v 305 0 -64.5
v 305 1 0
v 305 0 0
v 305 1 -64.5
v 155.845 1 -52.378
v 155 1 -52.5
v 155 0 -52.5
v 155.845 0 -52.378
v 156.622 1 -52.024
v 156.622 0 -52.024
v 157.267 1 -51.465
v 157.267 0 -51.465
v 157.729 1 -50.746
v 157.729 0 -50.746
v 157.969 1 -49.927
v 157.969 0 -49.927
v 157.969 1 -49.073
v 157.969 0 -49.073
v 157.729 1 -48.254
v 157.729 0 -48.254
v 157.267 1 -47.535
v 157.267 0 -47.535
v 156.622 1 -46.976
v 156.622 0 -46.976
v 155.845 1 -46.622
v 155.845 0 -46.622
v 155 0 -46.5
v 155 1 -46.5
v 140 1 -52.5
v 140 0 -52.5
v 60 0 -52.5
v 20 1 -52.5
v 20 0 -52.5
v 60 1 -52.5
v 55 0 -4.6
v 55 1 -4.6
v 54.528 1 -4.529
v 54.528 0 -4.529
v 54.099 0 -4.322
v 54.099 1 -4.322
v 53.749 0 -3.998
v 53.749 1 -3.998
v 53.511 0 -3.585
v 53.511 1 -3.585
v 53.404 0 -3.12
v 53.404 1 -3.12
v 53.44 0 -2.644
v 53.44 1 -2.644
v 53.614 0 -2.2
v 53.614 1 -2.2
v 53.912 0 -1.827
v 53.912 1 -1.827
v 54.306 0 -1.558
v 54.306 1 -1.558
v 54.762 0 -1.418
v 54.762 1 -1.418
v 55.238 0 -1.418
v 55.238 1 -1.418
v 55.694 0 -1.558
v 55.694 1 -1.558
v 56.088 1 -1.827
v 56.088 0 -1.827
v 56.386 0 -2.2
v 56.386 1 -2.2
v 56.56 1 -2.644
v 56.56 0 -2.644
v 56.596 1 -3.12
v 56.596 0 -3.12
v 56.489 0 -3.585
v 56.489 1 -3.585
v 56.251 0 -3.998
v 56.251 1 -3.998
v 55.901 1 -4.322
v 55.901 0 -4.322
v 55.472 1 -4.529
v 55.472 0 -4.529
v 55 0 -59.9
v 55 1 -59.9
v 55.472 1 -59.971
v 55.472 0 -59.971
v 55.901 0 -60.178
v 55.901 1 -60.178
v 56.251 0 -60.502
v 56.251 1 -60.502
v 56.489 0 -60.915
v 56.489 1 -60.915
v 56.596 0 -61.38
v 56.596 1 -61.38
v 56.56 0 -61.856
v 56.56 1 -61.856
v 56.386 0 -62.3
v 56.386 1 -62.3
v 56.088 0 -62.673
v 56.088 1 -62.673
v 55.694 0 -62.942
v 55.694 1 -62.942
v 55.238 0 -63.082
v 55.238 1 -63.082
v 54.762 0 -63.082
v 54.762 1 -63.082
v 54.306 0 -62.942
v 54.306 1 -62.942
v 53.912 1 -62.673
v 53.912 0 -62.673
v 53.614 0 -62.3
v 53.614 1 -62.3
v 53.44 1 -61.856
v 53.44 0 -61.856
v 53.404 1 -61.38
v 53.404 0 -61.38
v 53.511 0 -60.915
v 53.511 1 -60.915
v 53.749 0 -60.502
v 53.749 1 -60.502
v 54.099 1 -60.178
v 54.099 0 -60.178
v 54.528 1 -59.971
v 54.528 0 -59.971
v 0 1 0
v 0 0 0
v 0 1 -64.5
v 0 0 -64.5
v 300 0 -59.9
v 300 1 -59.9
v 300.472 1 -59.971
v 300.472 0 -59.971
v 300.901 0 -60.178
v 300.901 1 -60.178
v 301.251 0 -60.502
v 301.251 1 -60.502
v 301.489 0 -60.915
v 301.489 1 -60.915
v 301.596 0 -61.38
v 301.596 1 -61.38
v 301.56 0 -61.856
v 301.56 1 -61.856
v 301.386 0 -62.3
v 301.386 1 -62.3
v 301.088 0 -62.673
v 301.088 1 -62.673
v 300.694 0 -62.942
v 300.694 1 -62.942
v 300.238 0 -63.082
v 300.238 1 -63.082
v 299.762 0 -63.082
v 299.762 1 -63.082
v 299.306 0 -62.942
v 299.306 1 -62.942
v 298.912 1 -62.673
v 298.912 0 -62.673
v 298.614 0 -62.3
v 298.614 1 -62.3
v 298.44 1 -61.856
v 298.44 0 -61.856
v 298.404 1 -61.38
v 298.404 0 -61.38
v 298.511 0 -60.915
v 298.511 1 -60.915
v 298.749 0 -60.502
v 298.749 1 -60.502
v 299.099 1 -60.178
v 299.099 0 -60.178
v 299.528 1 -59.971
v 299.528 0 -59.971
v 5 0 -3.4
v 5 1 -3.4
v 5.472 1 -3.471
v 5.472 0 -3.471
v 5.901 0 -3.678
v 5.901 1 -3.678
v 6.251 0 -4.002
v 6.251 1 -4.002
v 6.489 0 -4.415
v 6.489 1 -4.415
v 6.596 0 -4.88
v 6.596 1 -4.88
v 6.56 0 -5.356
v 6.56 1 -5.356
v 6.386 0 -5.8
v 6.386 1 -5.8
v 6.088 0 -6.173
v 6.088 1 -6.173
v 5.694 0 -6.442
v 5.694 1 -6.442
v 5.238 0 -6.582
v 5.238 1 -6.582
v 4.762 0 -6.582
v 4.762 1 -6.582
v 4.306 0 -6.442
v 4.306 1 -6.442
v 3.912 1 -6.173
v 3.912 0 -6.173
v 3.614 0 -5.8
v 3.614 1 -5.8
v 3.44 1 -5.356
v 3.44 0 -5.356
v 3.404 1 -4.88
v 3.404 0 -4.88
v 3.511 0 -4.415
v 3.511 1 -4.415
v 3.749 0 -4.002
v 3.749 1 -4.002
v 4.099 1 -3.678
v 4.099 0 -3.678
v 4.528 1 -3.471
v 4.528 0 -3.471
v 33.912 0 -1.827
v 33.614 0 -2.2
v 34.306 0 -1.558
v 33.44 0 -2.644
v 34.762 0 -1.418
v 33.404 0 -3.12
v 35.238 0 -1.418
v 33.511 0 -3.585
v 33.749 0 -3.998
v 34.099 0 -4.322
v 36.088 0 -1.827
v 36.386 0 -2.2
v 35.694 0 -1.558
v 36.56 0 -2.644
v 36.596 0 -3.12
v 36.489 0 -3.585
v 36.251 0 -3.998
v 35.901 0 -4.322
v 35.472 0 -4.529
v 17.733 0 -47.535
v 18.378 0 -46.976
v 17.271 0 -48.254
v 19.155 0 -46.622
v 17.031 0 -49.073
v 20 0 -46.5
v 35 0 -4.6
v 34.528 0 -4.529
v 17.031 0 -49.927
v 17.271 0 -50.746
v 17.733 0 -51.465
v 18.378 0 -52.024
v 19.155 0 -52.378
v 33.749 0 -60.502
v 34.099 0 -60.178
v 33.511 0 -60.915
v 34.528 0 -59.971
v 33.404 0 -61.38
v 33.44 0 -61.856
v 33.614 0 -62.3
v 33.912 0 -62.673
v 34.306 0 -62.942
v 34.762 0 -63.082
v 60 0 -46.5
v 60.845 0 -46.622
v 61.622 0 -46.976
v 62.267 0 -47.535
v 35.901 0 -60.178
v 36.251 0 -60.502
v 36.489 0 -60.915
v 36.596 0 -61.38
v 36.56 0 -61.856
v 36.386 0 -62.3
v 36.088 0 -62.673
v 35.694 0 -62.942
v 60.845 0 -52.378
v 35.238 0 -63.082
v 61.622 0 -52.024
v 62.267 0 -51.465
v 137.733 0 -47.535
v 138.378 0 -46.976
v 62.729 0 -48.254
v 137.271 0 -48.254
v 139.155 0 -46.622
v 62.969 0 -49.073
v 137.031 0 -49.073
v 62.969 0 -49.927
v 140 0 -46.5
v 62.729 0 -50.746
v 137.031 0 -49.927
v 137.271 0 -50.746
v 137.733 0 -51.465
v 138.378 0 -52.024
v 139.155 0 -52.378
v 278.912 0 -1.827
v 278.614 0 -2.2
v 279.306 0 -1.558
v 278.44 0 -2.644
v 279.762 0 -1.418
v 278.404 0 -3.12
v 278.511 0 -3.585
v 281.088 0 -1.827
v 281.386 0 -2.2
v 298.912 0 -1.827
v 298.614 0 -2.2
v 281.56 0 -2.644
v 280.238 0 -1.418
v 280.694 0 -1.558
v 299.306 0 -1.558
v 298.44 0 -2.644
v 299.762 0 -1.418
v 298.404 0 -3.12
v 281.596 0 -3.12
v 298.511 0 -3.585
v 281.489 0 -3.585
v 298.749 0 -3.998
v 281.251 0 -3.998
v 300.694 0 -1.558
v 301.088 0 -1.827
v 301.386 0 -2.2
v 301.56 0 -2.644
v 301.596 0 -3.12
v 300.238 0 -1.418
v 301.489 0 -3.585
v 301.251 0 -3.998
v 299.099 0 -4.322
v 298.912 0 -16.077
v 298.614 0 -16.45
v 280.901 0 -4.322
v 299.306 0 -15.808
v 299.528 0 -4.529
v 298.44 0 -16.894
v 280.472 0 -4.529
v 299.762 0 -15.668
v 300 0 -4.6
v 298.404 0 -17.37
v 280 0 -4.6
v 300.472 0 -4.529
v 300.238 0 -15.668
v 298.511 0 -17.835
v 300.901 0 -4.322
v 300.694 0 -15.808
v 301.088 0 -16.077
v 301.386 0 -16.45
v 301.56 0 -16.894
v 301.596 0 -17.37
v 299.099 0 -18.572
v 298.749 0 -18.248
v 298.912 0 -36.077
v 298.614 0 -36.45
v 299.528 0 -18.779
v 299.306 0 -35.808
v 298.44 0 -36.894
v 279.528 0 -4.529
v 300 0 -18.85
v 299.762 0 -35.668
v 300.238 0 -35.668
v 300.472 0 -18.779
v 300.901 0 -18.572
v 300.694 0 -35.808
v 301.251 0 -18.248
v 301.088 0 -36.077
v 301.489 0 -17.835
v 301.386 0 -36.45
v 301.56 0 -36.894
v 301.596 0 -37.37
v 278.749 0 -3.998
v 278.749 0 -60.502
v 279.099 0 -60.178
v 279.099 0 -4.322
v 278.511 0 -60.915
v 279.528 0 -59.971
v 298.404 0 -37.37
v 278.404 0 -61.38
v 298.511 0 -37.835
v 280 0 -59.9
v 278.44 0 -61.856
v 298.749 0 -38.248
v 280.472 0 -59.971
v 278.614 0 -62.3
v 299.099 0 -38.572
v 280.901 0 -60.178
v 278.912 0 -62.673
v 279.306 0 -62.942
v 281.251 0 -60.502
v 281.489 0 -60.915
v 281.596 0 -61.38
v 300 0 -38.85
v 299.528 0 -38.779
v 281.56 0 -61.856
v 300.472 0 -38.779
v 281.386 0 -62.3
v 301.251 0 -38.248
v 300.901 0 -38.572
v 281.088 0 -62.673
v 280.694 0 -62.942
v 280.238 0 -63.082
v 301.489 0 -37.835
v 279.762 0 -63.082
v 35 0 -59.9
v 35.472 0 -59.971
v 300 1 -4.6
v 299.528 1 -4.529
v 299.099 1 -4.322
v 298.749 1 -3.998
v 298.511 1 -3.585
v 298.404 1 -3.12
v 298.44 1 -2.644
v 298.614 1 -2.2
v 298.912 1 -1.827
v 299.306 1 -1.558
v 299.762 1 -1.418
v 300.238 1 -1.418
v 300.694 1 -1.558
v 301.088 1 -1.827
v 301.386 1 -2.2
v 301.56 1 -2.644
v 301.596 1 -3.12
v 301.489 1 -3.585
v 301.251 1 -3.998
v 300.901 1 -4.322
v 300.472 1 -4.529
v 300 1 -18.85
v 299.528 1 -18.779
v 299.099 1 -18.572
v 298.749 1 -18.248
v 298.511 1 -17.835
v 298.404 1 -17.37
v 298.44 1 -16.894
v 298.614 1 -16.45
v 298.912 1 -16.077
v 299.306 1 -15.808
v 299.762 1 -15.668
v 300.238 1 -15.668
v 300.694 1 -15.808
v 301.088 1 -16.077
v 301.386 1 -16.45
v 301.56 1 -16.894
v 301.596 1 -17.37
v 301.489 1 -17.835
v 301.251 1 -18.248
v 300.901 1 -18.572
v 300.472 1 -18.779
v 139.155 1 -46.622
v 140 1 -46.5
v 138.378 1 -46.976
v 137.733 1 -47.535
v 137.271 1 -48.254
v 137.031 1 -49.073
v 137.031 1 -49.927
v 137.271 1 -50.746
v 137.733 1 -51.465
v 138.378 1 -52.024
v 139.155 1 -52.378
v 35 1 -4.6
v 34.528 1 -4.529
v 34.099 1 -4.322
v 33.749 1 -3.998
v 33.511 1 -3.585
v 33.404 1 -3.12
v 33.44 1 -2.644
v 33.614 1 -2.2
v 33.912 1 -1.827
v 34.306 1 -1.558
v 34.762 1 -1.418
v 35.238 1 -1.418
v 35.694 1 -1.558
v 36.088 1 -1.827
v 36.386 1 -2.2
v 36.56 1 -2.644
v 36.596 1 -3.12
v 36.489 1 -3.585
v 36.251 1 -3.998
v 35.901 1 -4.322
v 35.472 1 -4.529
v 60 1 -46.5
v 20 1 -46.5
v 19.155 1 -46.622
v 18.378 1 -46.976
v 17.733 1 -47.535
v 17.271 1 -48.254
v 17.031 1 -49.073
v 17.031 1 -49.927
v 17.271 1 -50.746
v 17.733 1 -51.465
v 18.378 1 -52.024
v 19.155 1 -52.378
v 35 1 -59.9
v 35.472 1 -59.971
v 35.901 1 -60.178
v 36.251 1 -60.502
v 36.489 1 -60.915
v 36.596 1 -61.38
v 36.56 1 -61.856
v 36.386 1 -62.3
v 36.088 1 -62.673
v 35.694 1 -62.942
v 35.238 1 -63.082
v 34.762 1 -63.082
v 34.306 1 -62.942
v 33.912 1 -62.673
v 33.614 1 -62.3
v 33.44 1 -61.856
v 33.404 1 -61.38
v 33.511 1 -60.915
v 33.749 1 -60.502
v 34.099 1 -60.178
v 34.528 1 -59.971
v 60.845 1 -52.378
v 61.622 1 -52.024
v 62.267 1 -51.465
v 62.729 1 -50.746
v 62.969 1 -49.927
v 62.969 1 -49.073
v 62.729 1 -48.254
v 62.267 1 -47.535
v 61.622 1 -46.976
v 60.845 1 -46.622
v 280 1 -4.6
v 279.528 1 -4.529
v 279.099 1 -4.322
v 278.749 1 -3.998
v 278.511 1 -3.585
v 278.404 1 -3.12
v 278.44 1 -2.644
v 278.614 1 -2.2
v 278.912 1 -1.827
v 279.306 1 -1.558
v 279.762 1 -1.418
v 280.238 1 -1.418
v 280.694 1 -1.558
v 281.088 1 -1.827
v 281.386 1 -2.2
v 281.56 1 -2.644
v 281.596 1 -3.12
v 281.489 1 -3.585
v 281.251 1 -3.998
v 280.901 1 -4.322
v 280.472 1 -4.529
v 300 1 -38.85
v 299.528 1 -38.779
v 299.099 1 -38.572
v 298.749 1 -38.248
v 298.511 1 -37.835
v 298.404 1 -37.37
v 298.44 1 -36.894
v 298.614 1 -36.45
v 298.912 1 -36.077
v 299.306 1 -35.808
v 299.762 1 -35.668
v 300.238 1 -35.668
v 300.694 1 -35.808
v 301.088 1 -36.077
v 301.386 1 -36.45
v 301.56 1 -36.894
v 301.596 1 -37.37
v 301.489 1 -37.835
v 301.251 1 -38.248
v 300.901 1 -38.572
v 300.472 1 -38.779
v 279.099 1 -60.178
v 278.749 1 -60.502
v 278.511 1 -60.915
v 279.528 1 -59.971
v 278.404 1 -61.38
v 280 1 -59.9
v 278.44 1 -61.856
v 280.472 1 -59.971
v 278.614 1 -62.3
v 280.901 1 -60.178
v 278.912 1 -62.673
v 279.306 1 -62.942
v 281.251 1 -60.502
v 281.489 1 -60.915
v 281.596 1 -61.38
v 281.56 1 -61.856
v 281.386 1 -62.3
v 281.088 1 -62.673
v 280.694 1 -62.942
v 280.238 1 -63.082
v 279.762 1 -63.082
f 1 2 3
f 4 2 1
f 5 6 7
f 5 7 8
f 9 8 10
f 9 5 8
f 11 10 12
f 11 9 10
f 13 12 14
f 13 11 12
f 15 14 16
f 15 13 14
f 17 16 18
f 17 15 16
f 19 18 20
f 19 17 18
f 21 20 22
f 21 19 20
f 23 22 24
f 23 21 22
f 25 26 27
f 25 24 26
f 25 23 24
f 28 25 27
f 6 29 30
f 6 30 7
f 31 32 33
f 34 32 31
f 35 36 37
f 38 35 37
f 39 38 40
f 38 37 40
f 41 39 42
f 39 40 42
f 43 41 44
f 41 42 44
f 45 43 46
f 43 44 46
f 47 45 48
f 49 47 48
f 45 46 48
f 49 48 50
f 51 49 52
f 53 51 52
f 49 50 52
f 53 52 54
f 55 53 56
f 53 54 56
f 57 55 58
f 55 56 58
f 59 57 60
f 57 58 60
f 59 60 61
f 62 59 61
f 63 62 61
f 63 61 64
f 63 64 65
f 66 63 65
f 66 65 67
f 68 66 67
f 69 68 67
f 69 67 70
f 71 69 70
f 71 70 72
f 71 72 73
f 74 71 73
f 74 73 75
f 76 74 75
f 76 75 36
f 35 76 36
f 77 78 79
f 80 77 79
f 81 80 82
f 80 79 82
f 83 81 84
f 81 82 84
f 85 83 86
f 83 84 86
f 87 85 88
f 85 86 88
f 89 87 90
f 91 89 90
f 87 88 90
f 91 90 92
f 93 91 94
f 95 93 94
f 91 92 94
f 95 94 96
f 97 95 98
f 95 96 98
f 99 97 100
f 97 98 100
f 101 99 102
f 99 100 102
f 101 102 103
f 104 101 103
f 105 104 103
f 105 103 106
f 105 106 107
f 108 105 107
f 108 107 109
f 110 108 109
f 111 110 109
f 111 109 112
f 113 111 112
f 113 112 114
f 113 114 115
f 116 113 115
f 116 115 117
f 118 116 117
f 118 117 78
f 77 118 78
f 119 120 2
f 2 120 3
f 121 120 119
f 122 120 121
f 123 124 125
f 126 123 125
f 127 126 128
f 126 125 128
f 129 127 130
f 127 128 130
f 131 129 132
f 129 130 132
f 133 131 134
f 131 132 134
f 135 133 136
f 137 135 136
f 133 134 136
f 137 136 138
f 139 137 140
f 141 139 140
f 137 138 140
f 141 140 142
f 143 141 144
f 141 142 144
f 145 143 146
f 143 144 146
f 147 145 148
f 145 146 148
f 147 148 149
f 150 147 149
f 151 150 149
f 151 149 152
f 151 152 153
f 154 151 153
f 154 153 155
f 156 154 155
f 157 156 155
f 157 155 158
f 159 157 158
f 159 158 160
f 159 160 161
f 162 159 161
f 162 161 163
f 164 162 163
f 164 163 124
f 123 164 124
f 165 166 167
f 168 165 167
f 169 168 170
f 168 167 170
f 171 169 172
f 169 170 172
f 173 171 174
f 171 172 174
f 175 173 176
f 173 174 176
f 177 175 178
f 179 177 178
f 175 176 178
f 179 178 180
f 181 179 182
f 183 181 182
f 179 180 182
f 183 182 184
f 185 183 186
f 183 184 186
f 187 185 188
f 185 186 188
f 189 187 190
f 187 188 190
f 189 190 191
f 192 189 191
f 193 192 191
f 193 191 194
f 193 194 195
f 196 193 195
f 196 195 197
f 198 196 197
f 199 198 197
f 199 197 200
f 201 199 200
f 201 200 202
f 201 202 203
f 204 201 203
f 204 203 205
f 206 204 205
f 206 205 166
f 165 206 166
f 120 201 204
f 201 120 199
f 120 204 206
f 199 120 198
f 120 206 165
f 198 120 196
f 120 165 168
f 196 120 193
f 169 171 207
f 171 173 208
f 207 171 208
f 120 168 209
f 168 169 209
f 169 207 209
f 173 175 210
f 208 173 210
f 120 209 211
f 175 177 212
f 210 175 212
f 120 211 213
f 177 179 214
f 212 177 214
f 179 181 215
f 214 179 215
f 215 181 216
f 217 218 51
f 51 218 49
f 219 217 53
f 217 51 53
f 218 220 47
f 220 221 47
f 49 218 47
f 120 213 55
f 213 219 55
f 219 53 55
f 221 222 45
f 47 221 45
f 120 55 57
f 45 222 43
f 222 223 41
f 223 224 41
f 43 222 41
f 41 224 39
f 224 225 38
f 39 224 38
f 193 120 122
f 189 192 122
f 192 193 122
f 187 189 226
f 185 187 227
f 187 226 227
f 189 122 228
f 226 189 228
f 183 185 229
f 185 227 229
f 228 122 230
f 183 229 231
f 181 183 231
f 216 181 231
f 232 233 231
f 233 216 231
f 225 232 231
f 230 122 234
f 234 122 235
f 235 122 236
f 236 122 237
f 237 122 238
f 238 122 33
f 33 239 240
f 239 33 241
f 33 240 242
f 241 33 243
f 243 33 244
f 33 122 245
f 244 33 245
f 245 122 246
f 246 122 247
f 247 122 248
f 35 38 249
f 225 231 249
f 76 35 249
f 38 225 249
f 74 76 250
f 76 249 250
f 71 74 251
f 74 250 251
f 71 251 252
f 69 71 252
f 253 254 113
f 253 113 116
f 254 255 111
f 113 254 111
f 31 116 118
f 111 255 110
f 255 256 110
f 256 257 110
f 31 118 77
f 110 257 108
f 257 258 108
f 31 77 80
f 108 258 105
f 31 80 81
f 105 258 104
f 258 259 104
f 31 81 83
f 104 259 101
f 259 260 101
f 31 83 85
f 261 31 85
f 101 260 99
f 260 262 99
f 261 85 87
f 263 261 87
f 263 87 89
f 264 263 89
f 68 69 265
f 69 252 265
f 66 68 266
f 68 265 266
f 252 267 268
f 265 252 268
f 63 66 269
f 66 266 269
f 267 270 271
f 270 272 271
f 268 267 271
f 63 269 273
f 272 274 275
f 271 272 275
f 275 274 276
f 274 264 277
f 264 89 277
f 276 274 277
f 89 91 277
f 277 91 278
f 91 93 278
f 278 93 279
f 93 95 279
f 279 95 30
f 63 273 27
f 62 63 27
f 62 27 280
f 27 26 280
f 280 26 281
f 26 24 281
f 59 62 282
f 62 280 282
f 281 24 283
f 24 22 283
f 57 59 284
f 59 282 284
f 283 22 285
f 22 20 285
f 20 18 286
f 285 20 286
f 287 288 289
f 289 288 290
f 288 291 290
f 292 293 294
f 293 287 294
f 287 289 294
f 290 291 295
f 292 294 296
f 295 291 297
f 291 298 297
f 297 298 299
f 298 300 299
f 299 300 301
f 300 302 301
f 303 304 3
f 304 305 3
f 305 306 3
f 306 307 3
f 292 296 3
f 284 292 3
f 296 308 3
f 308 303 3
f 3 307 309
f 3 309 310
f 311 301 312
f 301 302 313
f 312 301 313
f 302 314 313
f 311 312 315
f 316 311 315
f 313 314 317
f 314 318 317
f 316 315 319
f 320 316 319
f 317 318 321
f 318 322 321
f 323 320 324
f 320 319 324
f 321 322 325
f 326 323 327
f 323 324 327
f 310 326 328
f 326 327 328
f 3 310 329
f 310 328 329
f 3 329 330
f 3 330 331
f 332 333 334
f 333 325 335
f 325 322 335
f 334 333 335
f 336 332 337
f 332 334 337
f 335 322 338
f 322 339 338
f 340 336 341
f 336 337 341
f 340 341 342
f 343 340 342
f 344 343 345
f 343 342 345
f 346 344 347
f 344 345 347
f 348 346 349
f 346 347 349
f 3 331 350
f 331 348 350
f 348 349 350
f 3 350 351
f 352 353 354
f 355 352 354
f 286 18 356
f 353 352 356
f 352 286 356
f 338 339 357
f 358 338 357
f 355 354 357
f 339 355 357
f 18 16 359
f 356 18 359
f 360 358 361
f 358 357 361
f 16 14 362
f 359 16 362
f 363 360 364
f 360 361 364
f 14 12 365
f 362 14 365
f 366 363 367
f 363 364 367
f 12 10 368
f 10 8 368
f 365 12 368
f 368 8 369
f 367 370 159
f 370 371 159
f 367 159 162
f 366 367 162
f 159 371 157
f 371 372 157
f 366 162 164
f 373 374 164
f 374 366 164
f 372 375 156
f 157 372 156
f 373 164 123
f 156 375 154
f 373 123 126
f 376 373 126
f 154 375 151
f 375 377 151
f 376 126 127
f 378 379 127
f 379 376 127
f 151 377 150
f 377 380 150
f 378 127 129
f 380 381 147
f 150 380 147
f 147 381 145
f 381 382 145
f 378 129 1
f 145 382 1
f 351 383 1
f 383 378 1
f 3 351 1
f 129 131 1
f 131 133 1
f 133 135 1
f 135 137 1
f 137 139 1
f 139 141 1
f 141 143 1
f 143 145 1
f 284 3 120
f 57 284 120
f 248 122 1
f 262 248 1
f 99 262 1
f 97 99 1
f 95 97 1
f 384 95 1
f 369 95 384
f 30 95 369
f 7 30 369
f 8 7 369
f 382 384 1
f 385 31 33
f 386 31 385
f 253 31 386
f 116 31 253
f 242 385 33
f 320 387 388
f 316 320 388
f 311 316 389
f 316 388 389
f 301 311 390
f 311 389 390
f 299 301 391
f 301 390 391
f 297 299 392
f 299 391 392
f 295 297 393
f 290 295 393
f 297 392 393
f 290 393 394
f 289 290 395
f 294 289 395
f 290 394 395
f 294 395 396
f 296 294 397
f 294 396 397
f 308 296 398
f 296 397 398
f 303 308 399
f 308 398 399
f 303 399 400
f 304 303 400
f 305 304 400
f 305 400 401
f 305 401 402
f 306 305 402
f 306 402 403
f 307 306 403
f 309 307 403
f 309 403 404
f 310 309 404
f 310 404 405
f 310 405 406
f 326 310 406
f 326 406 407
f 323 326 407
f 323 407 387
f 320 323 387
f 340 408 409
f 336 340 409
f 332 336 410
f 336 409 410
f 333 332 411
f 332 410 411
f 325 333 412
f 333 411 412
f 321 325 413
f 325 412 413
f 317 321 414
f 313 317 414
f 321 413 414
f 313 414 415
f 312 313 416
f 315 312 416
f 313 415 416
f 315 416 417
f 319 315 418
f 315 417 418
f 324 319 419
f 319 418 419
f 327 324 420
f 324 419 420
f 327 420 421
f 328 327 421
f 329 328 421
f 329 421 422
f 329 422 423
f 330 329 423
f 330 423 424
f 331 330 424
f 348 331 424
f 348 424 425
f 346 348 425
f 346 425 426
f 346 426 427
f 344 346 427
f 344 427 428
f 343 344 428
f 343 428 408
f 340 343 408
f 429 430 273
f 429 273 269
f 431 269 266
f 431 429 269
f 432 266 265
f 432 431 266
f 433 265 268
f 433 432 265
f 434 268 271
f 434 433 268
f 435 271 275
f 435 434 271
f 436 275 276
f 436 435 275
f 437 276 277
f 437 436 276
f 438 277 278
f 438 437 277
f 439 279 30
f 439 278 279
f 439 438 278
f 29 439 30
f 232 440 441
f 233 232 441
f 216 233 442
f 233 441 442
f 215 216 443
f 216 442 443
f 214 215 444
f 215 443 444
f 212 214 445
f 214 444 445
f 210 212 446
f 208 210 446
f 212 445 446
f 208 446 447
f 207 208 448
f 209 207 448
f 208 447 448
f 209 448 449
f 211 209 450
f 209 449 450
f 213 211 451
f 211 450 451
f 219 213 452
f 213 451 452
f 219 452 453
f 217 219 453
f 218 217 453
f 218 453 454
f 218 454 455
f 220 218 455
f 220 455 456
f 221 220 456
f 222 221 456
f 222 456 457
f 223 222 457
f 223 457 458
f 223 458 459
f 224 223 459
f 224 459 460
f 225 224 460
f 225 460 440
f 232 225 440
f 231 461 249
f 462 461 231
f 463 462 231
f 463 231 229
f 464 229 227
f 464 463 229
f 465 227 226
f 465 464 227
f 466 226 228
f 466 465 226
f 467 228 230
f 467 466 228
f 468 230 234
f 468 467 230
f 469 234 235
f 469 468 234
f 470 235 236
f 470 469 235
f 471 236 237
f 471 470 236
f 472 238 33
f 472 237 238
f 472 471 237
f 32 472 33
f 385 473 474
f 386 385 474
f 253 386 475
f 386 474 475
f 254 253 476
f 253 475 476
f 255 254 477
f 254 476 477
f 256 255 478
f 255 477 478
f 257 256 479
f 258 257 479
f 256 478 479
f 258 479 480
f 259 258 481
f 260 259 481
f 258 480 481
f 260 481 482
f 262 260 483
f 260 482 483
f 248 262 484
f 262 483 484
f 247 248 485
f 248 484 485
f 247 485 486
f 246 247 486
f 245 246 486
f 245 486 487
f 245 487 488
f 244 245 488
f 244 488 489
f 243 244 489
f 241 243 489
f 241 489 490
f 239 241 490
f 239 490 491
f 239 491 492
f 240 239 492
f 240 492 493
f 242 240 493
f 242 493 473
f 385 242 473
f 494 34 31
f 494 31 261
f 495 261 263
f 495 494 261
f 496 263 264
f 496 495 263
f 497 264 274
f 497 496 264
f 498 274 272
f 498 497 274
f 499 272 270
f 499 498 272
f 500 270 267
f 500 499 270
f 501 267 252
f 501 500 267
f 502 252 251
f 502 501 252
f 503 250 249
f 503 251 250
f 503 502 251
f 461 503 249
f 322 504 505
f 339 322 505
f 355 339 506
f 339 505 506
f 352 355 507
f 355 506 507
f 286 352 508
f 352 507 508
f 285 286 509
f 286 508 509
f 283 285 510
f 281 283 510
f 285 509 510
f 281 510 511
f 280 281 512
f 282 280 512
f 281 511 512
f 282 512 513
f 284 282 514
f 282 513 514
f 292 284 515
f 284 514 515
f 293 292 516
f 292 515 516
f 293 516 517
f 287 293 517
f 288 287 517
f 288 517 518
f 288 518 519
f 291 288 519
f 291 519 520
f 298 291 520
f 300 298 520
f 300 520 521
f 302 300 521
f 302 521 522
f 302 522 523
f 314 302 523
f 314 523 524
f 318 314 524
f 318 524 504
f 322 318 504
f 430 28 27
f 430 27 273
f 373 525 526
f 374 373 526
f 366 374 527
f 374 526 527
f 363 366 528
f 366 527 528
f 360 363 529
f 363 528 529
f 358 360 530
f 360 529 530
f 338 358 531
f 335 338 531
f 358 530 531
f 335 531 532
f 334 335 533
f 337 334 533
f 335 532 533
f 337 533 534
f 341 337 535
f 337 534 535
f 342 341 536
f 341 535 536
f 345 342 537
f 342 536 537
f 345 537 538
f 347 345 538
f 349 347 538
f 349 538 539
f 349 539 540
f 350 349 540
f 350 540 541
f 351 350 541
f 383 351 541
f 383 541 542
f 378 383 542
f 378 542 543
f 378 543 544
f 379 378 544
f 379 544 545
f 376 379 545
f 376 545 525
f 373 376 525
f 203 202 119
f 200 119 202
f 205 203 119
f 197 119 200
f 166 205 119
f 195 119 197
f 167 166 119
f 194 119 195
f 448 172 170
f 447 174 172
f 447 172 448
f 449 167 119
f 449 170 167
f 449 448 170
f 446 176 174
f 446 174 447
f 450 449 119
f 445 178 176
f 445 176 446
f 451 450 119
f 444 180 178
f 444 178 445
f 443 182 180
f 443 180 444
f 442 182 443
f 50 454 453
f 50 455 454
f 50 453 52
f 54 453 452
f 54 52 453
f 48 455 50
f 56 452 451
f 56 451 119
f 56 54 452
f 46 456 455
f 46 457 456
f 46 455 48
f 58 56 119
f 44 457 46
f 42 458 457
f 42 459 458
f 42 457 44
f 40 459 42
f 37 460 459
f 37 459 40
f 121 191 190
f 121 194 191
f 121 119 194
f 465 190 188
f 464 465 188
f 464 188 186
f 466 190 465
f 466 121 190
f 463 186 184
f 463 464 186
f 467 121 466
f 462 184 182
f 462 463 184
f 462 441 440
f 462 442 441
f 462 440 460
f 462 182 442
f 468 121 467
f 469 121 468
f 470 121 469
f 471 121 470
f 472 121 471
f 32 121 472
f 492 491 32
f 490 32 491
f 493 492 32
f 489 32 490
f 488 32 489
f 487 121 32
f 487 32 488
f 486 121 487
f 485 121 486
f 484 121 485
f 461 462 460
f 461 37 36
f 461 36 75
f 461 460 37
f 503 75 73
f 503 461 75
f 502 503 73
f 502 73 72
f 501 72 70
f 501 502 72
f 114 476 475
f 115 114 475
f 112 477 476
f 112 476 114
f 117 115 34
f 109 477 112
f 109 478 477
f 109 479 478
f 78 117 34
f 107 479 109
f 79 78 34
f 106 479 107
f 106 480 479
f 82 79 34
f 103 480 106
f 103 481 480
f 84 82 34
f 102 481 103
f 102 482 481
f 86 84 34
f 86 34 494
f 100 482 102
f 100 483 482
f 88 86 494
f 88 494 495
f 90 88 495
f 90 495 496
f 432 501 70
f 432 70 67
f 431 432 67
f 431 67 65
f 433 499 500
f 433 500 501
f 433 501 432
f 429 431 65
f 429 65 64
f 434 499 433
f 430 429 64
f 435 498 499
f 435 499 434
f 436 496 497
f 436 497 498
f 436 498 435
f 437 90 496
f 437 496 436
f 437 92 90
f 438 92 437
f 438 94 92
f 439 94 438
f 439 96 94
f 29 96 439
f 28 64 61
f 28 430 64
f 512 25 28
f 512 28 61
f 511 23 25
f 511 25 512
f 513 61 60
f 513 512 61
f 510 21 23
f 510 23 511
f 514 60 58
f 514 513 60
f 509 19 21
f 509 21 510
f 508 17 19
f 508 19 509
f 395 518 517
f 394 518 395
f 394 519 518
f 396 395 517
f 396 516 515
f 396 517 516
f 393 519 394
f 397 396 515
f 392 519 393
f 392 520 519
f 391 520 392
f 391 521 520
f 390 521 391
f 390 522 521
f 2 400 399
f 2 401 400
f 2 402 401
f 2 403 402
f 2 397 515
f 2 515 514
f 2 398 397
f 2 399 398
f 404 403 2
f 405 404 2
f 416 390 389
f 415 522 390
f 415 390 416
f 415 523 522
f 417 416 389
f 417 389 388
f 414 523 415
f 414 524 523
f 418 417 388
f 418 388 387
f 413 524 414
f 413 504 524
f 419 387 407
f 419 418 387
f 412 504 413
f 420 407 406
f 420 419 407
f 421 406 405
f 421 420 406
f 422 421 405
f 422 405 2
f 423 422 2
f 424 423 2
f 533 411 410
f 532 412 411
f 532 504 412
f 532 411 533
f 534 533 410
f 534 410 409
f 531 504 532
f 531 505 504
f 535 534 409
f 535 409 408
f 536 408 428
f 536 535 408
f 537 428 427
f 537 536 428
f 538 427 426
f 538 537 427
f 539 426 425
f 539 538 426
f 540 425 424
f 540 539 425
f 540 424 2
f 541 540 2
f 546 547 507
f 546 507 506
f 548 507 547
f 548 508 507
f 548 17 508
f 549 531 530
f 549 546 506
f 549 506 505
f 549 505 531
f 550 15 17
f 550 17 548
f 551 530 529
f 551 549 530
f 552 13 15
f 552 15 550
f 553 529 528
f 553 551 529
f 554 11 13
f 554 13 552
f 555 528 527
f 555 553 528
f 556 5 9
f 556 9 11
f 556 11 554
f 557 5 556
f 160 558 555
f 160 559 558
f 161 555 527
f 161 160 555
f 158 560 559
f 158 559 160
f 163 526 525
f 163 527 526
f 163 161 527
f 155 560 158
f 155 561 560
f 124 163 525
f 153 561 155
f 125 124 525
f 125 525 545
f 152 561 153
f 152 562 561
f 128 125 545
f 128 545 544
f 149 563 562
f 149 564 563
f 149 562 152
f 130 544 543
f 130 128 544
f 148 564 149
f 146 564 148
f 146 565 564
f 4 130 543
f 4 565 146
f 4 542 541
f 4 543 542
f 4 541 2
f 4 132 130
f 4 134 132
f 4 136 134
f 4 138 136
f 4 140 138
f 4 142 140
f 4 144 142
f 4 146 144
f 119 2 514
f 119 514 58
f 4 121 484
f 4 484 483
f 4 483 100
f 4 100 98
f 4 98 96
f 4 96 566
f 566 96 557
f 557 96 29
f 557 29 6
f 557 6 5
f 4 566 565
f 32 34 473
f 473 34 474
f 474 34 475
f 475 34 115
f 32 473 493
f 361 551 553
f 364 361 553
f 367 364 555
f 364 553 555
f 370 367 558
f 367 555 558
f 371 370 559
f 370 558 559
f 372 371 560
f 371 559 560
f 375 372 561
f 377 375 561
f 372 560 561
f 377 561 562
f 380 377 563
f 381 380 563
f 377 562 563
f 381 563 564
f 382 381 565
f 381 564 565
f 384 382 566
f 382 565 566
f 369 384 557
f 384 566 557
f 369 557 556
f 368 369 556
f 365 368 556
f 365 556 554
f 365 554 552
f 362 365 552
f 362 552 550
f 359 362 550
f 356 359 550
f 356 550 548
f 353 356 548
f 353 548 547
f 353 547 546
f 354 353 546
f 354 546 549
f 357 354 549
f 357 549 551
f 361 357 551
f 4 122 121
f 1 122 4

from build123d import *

# Parameters (mm, degrees)
SKETCH_1_W          = 330
SKETCH_1_H          = 64.5
EXTRUDE_1_DEPTH     = 1
SKETCH_2_R          = 1.6
CUT_EXTRUDE_1_DEPTH = 337.245817818
CUT_EXTRUDE_2_REACH = 338.246
SKETCH_3_W          = 25
SKETCH_3_H          = 64.5
CUT_EXTRUDE_3_REACH = 313.747


with BuildPart() as part:
    # 草图1 → 凸台-拉伸1 (new body)
    with BuildSketch(Plane(origin=(0, 0, 0), x_dir=(1, 0, 0), z_dir=(0, 1, 0))):
        with Locations((165, 32.25)):
            Rectangle(SKETCH_1_W, SKETCH_1_H)
    extrude(amount=EXTRUDE_1_DEPTH)

    # 草图2 → 切除-拉伸1 (cut, through all)
    with BuildSketch(Plane(origin=(0, 1, 0), x_dir=(1, 0, 0), z_dir=(0, 1, 0))):
        with Locations(Location((35, 61.5, 0), (0, 0, 270))):
            Circle(SKETCH_2_R)
        with Locations(Location((55, 61.5, 0), (0, 0, 270))):
            Circle(SKETCH_2_R)
        with Locations(Location((280, 61.5, 0), (0, 0, 270))):
            Circle(SKETCH_2_R)
        with Locations(Location((300, 61.5, 0), (0, 0, 270))):
            Circle(SKETCH_2_R)
        with Locations(Location((300, 3, 0), (0, 0, 90))):
            Circle(SKETCH_2_R)
        with Locations(Location((280, 3, 0), (0, 0, 90))):
            Circle(SKETCH_2_R)
        with Locations(Location((55, 3, 0), (0, 0, 90))):
            Circle(SKETCH_2_R)
        with Locations(Location((35, 3, 0), (0, 0, 90))):
            Circle(SKETCH_2_R)
        with Locations(Location((300, 37.25, 0), (0, 0, 90))):
            Circle(SKETCH_2_R)
        with Locations(Location((300, 17.25, 0), (0, 0, 90))):
            Circle(SKETCH_2_R)
        with Locations(Location((5, 5, 0), (0, 0, 270))):
            Circle(SKETCH_2_R)
    extrude(amount=-CUT_EXTRUDE_1_DEPTH, mode=Mode.SUBTRACT)

    # 草图3 → 切除-拉伸2 (cut, up to next)
    with BuildSketch(Plane(origin=(0, 1, 0), x_dir=(1, 0, 0), z_dir=(0, 1, 0)), mode=Mode.PRIVATE) as cut_extrude_2_sk1:
        with Locations((317.5, 32.25)):
            Rectangle(SKETCH_3_W, SKETCH_3_H)
    cut_extrude_2_tool1 = extrude(cut_extrude_2_sk1.sketch, amount=-CUT_EXTRUDE_2_REACH, mode=Mode.PRIVATE) & part.part
    add(cut_extrude_2_tool1.solids().sort_by_distance((317.5, 1, -32.25))[0], mode=Mode.SUBTRACT)

    # 草图4 → 切除-拉伸3 (cut, up to next)
    with BuildSketch(Plane(origin=(0, 1, 0), x_dir=(1, 0, 0), z_dir=(0, 1, 0)), mode=Mode.PRIVATE) as cut_extrude_3_sk1:
        with BuildLine():
            Line((140, 52.5), (155, 52.5))
            ThreePointArc((155, 52.5), (158, 49.5), (155, 46.5))
            Line((155, 46.5), (140, 46.5))
            ThreePointArc((140, 46.5), (137, 49.5), (140, 52.5))
        make_face()
    cut_extrude_3_tool1 = extrude(cut_extrude_3_sk1.sketch, amount=-CUT_EXTRUDE_3_REACH, mode=Mode.PRIVATE) & part.part
    # 草图4 → 切除-拉伸3 (cut, up to next)
    with BuildSketch(Plane(origin=(0, 1, 0), x_dir=(1, 0, 0), z_dir=(0, 1, 0)), mode=Mode.PRIVATE) as cut_extrude_3_sk2:
        with BuildLine():
            Line((20, 52.5), (60, 52.5))
            ThreePointArc((60, 52.5), (63, 49.5), (60, 46.5))
            Line((60, 46.5), (20, 46.5))
            ThreePointArc((20, 46.5), (17, 49.5), (20, 52.5))
        make_face()
    cut_extrude_3_tool2 = extrude(cut_extrude_3_sk2.sketch, amount=-CUT_EXTRUDE_3_REACH, mode=Mode.PRIVATE) & part.part
    add(cut_extrude_3_tool1.solids().sort_by_distance((147.5, 1, -49.5))[0], mode=Mode.SUBTRACT)
    add(cut_extrude_3_tool2.solids().sort_by_distance((40, 1, -49.5))[0], mode=Mode.SUBTRACT)


solid = part.part
